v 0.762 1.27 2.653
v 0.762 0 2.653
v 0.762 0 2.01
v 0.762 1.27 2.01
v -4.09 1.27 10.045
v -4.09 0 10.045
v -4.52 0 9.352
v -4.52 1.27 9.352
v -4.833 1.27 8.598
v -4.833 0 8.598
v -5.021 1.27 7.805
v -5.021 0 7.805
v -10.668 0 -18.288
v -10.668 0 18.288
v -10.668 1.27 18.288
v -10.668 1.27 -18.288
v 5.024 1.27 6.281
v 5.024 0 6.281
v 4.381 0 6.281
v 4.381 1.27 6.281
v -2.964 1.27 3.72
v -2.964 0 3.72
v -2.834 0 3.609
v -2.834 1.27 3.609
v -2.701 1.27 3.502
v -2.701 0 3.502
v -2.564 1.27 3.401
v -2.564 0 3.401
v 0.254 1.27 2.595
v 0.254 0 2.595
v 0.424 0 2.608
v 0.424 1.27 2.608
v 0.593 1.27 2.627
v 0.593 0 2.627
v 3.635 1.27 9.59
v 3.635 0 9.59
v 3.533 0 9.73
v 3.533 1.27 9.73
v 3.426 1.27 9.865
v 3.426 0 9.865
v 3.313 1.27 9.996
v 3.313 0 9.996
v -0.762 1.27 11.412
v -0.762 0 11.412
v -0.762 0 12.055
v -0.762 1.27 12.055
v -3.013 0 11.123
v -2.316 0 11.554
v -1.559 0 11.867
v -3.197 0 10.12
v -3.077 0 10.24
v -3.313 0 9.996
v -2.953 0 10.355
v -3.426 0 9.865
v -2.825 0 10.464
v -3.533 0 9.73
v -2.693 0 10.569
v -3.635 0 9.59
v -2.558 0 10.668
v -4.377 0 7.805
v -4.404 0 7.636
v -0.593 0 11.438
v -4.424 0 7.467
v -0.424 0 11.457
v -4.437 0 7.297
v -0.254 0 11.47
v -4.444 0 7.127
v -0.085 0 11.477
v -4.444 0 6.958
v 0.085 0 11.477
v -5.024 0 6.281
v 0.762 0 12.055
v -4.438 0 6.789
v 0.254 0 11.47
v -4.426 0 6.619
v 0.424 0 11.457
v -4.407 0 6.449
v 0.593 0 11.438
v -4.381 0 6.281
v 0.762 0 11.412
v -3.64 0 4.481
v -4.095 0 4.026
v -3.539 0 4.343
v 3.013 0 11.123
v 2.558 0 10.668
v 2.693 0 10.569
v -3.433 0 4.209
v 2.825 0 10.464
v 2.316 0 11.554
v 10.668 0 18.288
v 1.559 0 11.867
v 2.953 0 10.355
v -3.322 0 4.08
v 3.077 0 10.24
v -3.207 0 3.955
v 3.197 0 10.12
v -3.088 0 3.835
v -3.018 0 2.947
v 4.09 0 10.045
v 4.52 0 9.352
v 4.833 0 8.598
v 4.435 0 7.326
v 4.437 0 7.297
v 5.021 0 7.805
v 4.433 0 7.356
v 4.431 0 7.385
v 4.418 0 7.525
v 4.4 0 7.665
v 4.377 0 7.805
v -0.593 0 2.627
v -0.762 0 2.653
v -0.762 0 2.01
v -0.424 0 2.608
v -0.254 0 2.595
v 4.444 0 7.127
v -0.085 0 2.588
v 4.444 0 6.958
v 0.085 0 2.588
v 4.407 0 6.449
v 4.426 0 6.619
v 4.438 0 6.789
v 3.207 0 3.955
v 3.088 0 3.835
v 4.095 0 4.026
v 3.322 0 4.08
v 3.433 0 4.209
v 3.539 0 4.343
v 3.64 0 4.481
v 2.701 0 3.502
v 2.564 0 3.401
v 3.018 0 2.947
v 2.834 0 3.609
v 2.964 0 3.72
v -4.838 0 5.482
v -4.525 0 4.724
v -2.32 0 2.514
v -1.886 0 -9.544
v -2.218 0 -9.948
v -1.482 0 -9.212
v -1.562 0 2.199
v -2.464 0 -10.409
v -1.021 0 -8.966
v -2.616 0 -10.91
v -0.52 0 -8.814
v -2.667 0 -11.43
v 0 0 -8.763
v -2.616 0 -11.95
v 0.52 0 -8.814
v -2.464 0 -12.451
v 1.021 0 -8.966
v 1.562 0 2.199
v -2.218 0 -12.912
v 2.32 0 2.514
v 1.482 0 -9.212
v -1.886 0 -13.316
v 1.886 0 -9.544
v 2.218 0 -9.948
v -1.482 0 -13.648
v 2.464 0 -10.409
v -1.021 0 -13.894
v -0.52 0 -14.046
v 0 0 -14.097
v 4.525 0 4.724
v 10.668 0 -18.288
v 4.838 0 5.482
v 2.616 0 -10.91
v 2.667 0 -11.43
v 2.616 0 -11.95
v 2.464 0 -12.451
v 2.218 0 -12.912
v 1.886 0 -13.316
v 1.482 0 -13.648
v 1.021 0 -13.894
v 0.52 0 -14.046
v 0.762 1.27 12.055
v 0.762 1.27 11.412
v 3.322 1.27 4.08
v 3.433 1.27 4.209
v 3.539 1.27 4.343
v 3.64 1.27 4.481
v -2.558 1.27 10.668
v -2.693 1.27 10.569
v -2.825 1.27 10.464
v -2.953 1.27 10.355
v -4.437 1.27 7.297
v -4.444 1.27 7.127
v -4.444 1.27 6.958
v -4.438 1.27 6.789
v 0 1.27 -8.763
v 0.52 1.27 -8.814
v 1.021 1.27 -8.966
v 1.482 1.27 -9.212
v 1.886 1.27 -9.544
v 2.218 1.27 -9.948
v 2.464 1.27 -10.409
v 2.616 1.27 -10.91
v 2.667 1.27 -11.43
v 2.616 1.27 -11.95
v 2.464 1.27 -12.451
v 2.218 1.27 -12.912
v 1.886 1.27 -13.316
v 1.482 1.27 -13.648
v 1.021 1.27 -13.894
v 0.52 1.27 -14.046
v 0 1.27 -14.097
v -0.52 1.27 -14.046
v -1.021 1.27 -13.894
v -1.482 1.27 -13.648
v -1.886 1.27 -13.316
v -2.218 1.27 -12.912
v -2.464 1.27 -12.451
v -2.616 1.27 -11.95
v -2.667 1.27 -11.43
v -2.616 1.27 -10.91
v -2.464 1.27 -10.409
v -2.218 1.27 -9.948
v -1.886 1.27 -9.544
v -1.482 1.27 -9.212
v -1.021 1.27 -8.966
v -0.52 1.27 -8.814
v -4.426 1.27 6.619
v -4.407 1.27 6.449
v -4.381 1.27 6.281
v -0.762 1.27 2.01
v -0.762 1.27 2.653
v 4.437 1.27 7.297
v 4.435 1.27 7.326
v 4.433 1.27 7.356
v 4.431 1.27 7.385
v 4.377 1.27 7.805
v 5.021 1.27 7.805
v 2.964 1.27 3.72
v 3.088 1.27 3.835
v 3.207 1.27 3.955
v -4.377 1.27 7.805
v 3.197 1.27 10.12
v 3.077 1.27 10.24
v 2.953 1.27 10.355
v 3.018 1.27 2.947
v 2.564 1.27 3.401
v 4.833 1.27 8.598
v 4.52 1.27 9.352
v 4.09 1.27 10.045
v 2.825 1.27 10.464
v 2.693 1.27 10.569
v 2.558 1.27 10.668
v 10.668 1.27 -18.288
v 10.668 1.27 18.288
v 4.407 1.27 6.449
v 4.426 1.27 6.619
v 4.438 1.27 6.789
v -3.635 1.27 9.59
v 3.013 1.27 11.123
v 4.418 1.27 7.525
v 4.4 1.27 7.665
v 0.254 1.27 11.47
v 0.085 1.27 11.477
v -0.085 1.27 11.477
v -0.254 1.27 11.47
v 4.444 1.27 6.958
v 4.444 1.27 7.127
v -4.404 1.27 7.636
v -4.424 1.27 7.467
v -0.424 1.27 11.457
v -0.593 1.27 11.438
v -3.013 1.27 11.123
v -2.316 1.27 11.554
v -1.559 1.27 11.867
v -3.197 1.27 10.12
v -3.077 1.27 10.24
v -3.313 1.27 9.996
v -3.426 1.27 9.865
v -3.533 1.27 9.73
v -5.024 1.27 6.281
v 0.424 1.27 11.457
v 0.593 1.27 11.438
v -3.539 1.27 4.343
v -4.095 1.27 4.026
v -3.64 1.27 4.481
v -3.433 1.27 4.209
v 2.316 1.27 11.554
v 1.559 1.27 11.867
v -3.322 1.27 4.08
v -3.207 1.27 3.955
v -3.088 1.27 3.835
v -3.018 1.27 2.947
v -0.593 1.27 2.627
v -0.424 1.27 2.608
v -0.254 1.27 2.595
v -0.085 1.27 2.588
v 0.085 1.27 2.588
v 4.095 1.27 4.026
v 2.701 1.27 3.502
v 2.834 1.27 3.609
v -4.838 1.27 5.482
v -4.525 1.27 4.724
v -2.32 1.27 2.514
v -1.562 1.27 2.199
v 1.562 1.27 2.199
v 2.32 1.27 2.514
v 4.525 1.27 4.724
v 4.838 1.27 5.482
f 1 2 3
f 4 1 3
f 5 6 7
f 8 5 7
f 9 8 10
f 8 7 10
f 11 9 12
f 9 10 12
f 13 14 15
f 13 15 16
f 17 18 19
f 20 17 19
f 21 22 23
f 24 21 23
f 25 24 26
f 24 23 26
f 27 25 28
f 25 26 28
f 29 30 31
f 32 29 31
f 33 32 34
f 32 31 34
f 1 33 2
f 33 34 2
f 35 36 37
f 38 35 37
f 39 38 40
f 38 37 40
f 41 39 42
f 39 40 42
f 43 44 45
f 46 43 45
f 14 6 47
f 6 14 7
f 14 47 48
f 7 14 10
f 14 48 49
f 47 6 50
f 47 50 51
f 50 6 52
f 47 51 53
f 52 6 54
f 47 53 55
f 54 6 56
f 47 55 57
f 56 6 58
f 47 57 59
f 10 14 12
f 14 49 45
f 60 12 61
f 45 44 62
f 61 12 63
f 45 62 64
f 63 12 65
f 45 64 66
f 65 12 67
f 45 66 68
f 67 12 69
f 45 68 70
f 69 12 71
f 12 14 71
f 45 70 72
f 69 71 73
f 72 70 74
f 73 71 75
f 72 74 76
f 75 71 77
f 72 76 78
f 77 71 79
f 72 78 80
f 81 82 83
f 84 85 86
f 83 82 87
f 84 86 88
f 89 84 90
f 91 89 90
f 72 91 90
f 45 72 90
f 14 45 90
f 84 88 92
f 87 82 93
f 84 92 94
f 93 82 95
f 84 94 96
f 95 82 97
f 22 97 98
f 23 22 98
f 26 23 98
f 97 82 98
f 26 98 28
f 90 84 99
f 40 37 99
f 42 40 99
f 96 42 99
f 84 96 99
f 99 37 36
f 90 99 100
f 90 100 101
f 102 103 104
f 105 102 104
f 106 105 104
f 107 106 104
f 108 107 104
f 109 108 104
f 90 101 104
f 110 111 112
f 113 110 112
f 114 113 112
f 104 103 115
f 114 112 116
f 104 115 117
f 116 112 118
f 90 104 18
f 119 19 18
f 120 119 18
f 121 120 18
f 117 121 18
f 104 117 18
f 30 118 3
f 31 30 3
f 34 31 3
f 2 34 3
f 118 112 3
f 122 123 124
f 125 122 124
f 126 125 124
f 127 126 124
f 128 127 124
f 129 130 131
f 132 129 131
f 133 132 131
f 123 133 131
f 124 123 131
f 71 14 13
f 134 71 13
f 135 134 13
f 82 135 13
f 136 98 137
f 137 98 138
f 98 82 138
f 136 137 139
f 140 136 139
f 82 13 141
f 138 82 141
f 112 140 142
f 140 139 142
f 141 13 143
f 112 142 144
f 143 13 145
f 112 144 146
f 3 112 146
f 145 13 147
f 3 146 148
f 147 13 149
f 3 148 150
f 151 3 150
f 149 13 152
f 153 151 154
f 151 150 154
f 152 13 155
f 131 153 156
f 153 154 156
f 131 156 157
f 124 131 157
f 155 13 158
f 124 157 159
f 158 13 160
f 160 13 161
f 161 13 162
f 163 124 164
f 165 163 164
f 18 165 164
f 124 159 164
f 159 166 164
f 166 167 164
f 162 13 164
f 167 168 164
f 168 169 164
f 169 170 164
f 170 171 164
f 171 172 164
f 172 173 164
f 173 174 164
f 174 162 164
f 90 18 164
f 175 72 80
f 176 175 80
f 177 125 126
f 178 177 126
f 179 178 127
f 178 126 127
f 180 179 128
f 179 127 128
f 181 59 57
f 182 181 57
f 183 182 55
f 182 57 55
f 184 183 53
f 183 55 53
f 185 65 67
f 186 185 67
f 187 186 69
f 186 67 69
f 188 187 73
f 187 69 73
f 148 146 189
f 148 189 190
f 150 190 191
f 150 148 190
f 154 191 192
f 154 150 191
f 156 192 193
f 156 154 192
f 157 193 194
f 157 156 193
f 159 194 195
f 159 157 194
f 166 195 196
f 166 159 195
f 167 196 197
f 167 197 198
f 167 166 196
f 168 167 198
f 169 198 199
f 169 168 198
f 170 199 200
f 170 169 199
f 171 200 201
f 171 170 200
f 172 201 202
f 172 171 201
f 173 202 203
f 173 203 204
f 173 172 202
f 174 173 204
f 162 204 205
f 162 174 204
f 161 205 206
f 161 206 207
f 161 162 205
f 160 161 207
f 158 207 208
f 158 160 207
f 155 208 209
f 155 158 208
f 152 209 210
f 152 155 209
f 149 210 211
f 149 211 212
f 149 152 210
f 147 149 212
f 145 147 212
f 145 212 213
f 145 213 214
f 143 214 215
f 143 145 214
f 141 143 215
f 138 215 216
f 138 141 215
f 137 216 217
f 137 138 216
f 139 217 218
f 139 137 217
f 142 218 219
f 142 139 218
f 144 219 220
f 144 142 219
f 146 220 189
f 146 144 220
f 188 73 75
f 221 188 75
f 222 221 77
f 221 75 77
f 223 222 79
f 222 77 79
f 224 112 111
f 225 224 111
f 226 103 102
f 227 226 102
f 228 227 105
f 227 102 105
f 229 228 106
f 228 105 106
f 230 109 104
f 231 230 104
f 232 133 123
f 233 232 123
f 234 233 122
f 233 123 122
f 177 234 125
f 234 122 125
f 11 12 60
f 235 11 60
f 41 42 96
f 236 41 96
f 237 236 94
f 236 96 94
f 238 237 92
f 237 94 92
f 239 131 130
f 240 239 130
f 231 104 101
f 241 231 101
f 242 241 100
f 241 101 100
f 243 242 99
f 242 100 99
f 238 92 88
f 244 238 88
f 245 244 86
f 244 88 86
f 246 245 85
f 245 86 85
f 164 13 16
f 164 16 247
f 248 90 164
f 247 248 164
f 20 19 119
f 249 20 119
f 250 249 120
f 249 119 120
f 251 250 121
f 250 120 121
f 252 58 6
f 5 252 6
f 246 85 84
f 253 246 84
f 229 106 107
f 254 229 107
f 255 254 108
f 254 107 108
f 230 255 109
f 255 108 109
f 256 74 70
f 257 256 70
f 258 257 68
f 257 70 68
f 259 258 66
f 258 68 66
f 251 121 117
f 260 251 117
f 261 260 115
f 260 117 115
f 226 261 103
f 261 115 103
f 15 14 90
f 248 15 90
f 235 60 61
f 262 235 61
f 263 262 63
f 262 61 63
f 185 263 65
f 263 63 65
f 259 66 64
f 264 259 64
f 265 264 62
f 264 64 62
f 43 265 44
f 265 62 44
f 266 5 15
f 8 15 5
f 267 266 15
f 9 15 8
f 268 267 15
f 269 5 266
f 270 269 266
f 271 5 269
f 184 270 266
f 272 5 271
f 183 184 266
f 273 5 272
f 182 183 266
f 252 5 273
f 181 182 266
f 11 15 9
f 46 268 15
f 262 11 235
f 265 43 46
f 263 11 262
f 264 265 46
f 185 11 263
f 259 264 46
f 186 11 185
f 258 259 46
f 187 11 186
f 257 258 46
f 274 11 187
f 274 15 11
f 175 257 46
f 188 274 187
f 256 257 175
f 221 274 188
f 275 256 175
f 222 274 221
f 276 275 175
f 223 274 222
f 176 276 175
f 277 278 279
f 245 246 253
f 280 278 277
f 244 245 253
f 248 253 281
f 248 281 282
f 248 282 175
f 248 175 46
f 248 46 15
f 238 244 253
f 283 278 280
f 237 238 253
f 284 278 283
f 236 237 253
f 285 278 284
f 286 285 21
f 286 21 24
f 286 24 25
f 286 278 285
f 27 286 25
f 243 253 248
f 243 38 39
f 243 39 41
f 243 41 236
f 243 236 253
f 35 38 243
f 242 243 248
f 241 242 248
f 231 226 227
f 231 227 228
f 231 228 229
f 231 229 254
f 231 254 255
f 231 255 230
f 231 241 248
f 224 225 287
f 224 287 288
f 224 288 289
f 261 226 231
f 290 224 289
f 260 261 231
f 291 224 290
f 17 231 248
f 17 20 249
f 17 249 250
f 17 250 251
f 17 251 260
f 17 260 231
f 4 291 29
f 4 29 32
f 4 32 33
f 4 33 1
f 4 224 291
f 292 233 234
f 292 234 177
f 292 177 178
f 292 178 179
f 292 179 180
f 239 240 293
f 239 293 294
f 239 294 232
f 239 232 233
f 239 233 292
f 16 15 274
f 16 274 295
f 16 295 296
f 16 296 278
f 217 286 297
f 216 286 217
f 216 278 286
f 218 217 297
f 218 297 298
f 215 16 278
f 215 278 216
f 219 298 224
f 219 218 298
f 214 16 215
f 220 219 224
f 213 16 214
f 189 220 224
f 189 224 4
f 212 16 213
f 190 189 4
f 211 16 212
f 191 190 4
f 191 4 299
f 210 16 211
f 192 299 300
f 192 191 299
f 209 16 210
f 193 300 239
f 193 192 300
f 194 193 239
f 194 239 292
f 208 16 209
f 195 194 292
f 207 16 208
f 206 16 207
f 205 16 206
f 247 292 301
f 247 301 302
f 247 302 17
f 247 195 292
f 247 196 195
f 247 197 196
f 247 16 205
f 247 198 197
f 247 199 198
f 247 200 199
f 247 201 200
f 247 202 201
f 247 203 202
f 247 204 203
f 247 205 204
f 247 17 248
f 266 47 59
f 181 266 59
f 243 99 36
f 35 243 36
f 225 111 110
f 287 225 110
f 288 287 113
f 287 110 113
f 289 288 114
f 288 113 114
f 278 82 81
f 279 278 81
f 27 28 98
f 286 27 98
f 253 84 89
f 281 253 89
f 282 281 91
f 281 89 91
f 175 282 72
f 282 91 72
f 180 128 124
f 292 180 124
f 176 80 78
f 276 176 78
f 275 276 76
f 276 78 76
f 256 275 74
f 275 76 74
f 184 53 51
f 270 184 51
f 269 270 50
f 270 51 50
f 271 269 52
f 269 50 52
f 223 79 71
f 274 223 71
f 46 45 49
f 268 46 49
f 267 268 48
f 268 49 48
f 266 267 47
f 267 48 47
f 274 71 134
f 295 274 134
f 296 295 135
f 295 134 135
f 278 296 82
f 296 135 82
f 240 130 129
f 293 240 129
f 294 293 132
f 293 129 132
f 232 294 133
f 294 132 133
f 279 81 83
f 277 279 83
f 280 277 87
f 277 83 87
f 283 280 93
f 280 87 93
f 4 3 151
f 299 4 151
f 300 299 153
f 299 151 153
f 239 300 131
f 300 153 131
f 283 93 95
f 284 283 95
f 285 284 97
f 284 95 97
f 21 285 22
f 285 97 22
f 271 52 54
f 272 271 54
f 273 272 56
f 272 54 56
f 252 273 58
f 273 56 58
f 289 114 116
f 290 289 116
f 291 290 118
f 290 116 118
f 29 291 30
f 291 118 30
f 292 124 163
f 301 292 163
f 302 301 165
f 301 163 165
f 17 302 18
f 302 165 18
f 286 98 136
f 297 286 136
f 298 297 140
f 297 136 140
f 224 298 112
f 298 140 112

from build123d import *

# Parameters (mm, degrees)
SKETCH1_W           = 21.336
SKETCH1_H           = 36.576
SKETCH1_R           = 2.667
BOSS_EXTRUDE1_DEPTH = 1.27


with BuildPart() as part:
    # Sketch1 → Boss-Extrude1 (new body)
    with BuildSketch(Plane(origin=(0, 0, 0), x_dir=(1, 0, 0), z_dir=(0, 1, 0))):
        Rectangle(SKETCH1_W, SKETCH1_H)
        with BuildLine():
            Line((3.018435283, -2.946661255), (2.56364651, -3.401450028))
            ThreePointArc((2.56364651, -3.401450028), (2.768236135, -3.554896302), (2.963662393, -3.719854635))
            ThreePointArc((2.963662393, -3.719854635), (3.148123637, -3.8946201), (3.322296862, -4.079640655))
            ThreePointArc((3.322296862, -4.079640655), (3.486686927, -4.275669436), (3.639526827, -4.480831181))
            Line((3.639526827, -4.480831181), (4.094539809, -4.025818198))
            ThreePointArc((4.094539809, -4.025818198), (4.696624497, -5.096661904), (5.024040768, -6.280727273))
            Line((5.024040768, -6.280727273), (4.380937187, -6.280727273))
            ThreePointArc((4.380937187, -6.280727273), (4.416928537, -6.533901895), (4.438301261, -6.788727273))
            ThreePointArc((4.438301261, -6.788727273), (4.44498858, -7.042743737), (4.437149708, -7.296727273))
            ThreePointArc((4.437149708, -7.296727273), (4.43430089, -7.340889368), (4.431012547, -7.385020912))
            ThreePointArc((4.431012547, -7.385020912), (4.409221171, -7.595511932), (4.377436347, -7.804727273))
            Line((4.377436347, -7.804727273), (5.020988346, -7.804727273))
            ThreePointArc((5.020988346, -7.804727273), (4.691358526, -8.981399356), (4.090276757, -10.045313694))
            Line((4.090276757, -10.045313694), (3.635376444, -9.590413381))
            ThreePointArc((3.635376444, -9.590413381), (3.480018154, -9.798078789), (3.312813037, -9.996330065))
            ThreePointArc((3.312813037, -9.996330065), (3.138047572, -10.180791309), (2.953027016, -10.354964534))
            ThreePointArc((2.953027016, -10.354964534), (2.759829472, -10.51711401), (2.557745709, -10.668044115))
            Line((2.557745709, -10.668044115), (3.012646022, -11.122944428))
            ThreePointArc((3.012646022, -11.122944428), (1.944031836, -11.725975697), (0.762, -12.055192535))
            Line((0.762, -12.055192535), (0.762, -11.411866343))
            ThreePointArc((0.762, -11.411866343), (0.508842492, -11.448446688), (0.254, -11.470404595))
            ThreePointArc((0.254, -11.470404595), (0, -11.477667672), (-0.254, -11.470404595))
            ThreePointArc((-0.254, -11.470404595), (-0.508842492, -11.448446688), (-0.762, -11.411866343))
            Line((-0.762, -11.411866343), (-0.762, -12.055192535))
            ThreePointArc((-0.762, -12.055192535), (-1.944031836, -11.725975697), (-3.012646022, -11.122944428))
            Line((-3.012646022, -11.122944428), (-2.557745709, -10.668044115))
            ThreePointArc((-2.557745709, -10.668044115), (-2.759829472, -10.51711401), (-2.953027016, -10.354964534))
            ThreePointArc((-2.953027016, -10.354964534), (-3.138047572, -10.180791309), (-3.312813037, -9.996330065))
            ThreePointArc((-3.312813037, -9.996330065), (-3.480018154, -9.798078789), (-3.635376444, -9.590413381))
            Line((-3.635376444, -9.590413381), (-4.090276757, -10.045313694))
            ThreePointArc((-4.090276757, -10.045313694), (-4.691358526, -8.981399356), (-5.020988346, -7.804727273))
            Line((-5.020988346, -7.804727273), (-4.377436347, -7.804727273))
            ThreePointArc((-4.377436347, -7.804727273), (-4.414606192, -7.551586906), (-4.437149708, -7.296727273))
            ThreePointArc((-4.437149708, -7.296727273), (-4.44498858, -7.042743737), (-4.438301261, -6.788727273))
            ThreePointArc((-4.438301261, -6.788727273), (-4.416928537, -6.533901895), (-4.380937187, -6.280727273))
            Line((-4.380937187, -6.280727273), (-5.024040768, -6.280727273))
            ThreePointArc((-5.024040768, -6.280727273), (-4.696624497, -5.096661904), (-4.094539809, -4.025818198))
            Line((-4.094539809, -4.025818198), (-3.639526827, -4.480831181))
            ThreePointArc((-3.639526827, -4.480831181), (-3.486686927, -4.275669436), (-3.322296862, -4.079640655))
            ThreePointArc((-3.322296862, -4.079640655), (-3.148123637, -3.8946201), (-2.963662393, -3.719854635))
            ThreePointArc((-2.963662393, -3.719854635), (-2.768236135, -3.554896302), (-2.56364651, -3.401450028))
            Line((-2.56364651, -3.401450028), (-3.018435283, -2.946661255))
            ThreePointArc((-3.018435283, -2.946661255), (-1.94735447, -2.340737305), (-0.762, -2.010142809))
            Line((-0.762, -2.010142809), (-0.762, -2.653469001))
            ThreePointArc((-0.762, -2.653469001), (-0.508842492, -2.616888656), (-0.254, -2.594930748))
            ThreePointArc((-0.254, -2.594930748), (0, -2.587667672), (0.254, -2.594930748))
            ThreePointArc((0.254, -2.594930748), (0.508842492, -2.616888656), (0.762, -2.653469001))
            Line((0.762, -2.653469001), (0.762, -2.010142809))
            ThreePointArc((0.762, -2.010142809), (1.94735447, -2.340737305), (3.018435283, -2.946661255))
        make_face(mode=Mode.SUBTRACT)
        with Locations(Location((0, 11.43, 0), (0, 0, 270))):
            Circle(SKETCH1_R, mode=Mode.SUBTRACT)
    extrude(amount=BOSS_EXTRUDE1_DEPTH)


solid = part.part
